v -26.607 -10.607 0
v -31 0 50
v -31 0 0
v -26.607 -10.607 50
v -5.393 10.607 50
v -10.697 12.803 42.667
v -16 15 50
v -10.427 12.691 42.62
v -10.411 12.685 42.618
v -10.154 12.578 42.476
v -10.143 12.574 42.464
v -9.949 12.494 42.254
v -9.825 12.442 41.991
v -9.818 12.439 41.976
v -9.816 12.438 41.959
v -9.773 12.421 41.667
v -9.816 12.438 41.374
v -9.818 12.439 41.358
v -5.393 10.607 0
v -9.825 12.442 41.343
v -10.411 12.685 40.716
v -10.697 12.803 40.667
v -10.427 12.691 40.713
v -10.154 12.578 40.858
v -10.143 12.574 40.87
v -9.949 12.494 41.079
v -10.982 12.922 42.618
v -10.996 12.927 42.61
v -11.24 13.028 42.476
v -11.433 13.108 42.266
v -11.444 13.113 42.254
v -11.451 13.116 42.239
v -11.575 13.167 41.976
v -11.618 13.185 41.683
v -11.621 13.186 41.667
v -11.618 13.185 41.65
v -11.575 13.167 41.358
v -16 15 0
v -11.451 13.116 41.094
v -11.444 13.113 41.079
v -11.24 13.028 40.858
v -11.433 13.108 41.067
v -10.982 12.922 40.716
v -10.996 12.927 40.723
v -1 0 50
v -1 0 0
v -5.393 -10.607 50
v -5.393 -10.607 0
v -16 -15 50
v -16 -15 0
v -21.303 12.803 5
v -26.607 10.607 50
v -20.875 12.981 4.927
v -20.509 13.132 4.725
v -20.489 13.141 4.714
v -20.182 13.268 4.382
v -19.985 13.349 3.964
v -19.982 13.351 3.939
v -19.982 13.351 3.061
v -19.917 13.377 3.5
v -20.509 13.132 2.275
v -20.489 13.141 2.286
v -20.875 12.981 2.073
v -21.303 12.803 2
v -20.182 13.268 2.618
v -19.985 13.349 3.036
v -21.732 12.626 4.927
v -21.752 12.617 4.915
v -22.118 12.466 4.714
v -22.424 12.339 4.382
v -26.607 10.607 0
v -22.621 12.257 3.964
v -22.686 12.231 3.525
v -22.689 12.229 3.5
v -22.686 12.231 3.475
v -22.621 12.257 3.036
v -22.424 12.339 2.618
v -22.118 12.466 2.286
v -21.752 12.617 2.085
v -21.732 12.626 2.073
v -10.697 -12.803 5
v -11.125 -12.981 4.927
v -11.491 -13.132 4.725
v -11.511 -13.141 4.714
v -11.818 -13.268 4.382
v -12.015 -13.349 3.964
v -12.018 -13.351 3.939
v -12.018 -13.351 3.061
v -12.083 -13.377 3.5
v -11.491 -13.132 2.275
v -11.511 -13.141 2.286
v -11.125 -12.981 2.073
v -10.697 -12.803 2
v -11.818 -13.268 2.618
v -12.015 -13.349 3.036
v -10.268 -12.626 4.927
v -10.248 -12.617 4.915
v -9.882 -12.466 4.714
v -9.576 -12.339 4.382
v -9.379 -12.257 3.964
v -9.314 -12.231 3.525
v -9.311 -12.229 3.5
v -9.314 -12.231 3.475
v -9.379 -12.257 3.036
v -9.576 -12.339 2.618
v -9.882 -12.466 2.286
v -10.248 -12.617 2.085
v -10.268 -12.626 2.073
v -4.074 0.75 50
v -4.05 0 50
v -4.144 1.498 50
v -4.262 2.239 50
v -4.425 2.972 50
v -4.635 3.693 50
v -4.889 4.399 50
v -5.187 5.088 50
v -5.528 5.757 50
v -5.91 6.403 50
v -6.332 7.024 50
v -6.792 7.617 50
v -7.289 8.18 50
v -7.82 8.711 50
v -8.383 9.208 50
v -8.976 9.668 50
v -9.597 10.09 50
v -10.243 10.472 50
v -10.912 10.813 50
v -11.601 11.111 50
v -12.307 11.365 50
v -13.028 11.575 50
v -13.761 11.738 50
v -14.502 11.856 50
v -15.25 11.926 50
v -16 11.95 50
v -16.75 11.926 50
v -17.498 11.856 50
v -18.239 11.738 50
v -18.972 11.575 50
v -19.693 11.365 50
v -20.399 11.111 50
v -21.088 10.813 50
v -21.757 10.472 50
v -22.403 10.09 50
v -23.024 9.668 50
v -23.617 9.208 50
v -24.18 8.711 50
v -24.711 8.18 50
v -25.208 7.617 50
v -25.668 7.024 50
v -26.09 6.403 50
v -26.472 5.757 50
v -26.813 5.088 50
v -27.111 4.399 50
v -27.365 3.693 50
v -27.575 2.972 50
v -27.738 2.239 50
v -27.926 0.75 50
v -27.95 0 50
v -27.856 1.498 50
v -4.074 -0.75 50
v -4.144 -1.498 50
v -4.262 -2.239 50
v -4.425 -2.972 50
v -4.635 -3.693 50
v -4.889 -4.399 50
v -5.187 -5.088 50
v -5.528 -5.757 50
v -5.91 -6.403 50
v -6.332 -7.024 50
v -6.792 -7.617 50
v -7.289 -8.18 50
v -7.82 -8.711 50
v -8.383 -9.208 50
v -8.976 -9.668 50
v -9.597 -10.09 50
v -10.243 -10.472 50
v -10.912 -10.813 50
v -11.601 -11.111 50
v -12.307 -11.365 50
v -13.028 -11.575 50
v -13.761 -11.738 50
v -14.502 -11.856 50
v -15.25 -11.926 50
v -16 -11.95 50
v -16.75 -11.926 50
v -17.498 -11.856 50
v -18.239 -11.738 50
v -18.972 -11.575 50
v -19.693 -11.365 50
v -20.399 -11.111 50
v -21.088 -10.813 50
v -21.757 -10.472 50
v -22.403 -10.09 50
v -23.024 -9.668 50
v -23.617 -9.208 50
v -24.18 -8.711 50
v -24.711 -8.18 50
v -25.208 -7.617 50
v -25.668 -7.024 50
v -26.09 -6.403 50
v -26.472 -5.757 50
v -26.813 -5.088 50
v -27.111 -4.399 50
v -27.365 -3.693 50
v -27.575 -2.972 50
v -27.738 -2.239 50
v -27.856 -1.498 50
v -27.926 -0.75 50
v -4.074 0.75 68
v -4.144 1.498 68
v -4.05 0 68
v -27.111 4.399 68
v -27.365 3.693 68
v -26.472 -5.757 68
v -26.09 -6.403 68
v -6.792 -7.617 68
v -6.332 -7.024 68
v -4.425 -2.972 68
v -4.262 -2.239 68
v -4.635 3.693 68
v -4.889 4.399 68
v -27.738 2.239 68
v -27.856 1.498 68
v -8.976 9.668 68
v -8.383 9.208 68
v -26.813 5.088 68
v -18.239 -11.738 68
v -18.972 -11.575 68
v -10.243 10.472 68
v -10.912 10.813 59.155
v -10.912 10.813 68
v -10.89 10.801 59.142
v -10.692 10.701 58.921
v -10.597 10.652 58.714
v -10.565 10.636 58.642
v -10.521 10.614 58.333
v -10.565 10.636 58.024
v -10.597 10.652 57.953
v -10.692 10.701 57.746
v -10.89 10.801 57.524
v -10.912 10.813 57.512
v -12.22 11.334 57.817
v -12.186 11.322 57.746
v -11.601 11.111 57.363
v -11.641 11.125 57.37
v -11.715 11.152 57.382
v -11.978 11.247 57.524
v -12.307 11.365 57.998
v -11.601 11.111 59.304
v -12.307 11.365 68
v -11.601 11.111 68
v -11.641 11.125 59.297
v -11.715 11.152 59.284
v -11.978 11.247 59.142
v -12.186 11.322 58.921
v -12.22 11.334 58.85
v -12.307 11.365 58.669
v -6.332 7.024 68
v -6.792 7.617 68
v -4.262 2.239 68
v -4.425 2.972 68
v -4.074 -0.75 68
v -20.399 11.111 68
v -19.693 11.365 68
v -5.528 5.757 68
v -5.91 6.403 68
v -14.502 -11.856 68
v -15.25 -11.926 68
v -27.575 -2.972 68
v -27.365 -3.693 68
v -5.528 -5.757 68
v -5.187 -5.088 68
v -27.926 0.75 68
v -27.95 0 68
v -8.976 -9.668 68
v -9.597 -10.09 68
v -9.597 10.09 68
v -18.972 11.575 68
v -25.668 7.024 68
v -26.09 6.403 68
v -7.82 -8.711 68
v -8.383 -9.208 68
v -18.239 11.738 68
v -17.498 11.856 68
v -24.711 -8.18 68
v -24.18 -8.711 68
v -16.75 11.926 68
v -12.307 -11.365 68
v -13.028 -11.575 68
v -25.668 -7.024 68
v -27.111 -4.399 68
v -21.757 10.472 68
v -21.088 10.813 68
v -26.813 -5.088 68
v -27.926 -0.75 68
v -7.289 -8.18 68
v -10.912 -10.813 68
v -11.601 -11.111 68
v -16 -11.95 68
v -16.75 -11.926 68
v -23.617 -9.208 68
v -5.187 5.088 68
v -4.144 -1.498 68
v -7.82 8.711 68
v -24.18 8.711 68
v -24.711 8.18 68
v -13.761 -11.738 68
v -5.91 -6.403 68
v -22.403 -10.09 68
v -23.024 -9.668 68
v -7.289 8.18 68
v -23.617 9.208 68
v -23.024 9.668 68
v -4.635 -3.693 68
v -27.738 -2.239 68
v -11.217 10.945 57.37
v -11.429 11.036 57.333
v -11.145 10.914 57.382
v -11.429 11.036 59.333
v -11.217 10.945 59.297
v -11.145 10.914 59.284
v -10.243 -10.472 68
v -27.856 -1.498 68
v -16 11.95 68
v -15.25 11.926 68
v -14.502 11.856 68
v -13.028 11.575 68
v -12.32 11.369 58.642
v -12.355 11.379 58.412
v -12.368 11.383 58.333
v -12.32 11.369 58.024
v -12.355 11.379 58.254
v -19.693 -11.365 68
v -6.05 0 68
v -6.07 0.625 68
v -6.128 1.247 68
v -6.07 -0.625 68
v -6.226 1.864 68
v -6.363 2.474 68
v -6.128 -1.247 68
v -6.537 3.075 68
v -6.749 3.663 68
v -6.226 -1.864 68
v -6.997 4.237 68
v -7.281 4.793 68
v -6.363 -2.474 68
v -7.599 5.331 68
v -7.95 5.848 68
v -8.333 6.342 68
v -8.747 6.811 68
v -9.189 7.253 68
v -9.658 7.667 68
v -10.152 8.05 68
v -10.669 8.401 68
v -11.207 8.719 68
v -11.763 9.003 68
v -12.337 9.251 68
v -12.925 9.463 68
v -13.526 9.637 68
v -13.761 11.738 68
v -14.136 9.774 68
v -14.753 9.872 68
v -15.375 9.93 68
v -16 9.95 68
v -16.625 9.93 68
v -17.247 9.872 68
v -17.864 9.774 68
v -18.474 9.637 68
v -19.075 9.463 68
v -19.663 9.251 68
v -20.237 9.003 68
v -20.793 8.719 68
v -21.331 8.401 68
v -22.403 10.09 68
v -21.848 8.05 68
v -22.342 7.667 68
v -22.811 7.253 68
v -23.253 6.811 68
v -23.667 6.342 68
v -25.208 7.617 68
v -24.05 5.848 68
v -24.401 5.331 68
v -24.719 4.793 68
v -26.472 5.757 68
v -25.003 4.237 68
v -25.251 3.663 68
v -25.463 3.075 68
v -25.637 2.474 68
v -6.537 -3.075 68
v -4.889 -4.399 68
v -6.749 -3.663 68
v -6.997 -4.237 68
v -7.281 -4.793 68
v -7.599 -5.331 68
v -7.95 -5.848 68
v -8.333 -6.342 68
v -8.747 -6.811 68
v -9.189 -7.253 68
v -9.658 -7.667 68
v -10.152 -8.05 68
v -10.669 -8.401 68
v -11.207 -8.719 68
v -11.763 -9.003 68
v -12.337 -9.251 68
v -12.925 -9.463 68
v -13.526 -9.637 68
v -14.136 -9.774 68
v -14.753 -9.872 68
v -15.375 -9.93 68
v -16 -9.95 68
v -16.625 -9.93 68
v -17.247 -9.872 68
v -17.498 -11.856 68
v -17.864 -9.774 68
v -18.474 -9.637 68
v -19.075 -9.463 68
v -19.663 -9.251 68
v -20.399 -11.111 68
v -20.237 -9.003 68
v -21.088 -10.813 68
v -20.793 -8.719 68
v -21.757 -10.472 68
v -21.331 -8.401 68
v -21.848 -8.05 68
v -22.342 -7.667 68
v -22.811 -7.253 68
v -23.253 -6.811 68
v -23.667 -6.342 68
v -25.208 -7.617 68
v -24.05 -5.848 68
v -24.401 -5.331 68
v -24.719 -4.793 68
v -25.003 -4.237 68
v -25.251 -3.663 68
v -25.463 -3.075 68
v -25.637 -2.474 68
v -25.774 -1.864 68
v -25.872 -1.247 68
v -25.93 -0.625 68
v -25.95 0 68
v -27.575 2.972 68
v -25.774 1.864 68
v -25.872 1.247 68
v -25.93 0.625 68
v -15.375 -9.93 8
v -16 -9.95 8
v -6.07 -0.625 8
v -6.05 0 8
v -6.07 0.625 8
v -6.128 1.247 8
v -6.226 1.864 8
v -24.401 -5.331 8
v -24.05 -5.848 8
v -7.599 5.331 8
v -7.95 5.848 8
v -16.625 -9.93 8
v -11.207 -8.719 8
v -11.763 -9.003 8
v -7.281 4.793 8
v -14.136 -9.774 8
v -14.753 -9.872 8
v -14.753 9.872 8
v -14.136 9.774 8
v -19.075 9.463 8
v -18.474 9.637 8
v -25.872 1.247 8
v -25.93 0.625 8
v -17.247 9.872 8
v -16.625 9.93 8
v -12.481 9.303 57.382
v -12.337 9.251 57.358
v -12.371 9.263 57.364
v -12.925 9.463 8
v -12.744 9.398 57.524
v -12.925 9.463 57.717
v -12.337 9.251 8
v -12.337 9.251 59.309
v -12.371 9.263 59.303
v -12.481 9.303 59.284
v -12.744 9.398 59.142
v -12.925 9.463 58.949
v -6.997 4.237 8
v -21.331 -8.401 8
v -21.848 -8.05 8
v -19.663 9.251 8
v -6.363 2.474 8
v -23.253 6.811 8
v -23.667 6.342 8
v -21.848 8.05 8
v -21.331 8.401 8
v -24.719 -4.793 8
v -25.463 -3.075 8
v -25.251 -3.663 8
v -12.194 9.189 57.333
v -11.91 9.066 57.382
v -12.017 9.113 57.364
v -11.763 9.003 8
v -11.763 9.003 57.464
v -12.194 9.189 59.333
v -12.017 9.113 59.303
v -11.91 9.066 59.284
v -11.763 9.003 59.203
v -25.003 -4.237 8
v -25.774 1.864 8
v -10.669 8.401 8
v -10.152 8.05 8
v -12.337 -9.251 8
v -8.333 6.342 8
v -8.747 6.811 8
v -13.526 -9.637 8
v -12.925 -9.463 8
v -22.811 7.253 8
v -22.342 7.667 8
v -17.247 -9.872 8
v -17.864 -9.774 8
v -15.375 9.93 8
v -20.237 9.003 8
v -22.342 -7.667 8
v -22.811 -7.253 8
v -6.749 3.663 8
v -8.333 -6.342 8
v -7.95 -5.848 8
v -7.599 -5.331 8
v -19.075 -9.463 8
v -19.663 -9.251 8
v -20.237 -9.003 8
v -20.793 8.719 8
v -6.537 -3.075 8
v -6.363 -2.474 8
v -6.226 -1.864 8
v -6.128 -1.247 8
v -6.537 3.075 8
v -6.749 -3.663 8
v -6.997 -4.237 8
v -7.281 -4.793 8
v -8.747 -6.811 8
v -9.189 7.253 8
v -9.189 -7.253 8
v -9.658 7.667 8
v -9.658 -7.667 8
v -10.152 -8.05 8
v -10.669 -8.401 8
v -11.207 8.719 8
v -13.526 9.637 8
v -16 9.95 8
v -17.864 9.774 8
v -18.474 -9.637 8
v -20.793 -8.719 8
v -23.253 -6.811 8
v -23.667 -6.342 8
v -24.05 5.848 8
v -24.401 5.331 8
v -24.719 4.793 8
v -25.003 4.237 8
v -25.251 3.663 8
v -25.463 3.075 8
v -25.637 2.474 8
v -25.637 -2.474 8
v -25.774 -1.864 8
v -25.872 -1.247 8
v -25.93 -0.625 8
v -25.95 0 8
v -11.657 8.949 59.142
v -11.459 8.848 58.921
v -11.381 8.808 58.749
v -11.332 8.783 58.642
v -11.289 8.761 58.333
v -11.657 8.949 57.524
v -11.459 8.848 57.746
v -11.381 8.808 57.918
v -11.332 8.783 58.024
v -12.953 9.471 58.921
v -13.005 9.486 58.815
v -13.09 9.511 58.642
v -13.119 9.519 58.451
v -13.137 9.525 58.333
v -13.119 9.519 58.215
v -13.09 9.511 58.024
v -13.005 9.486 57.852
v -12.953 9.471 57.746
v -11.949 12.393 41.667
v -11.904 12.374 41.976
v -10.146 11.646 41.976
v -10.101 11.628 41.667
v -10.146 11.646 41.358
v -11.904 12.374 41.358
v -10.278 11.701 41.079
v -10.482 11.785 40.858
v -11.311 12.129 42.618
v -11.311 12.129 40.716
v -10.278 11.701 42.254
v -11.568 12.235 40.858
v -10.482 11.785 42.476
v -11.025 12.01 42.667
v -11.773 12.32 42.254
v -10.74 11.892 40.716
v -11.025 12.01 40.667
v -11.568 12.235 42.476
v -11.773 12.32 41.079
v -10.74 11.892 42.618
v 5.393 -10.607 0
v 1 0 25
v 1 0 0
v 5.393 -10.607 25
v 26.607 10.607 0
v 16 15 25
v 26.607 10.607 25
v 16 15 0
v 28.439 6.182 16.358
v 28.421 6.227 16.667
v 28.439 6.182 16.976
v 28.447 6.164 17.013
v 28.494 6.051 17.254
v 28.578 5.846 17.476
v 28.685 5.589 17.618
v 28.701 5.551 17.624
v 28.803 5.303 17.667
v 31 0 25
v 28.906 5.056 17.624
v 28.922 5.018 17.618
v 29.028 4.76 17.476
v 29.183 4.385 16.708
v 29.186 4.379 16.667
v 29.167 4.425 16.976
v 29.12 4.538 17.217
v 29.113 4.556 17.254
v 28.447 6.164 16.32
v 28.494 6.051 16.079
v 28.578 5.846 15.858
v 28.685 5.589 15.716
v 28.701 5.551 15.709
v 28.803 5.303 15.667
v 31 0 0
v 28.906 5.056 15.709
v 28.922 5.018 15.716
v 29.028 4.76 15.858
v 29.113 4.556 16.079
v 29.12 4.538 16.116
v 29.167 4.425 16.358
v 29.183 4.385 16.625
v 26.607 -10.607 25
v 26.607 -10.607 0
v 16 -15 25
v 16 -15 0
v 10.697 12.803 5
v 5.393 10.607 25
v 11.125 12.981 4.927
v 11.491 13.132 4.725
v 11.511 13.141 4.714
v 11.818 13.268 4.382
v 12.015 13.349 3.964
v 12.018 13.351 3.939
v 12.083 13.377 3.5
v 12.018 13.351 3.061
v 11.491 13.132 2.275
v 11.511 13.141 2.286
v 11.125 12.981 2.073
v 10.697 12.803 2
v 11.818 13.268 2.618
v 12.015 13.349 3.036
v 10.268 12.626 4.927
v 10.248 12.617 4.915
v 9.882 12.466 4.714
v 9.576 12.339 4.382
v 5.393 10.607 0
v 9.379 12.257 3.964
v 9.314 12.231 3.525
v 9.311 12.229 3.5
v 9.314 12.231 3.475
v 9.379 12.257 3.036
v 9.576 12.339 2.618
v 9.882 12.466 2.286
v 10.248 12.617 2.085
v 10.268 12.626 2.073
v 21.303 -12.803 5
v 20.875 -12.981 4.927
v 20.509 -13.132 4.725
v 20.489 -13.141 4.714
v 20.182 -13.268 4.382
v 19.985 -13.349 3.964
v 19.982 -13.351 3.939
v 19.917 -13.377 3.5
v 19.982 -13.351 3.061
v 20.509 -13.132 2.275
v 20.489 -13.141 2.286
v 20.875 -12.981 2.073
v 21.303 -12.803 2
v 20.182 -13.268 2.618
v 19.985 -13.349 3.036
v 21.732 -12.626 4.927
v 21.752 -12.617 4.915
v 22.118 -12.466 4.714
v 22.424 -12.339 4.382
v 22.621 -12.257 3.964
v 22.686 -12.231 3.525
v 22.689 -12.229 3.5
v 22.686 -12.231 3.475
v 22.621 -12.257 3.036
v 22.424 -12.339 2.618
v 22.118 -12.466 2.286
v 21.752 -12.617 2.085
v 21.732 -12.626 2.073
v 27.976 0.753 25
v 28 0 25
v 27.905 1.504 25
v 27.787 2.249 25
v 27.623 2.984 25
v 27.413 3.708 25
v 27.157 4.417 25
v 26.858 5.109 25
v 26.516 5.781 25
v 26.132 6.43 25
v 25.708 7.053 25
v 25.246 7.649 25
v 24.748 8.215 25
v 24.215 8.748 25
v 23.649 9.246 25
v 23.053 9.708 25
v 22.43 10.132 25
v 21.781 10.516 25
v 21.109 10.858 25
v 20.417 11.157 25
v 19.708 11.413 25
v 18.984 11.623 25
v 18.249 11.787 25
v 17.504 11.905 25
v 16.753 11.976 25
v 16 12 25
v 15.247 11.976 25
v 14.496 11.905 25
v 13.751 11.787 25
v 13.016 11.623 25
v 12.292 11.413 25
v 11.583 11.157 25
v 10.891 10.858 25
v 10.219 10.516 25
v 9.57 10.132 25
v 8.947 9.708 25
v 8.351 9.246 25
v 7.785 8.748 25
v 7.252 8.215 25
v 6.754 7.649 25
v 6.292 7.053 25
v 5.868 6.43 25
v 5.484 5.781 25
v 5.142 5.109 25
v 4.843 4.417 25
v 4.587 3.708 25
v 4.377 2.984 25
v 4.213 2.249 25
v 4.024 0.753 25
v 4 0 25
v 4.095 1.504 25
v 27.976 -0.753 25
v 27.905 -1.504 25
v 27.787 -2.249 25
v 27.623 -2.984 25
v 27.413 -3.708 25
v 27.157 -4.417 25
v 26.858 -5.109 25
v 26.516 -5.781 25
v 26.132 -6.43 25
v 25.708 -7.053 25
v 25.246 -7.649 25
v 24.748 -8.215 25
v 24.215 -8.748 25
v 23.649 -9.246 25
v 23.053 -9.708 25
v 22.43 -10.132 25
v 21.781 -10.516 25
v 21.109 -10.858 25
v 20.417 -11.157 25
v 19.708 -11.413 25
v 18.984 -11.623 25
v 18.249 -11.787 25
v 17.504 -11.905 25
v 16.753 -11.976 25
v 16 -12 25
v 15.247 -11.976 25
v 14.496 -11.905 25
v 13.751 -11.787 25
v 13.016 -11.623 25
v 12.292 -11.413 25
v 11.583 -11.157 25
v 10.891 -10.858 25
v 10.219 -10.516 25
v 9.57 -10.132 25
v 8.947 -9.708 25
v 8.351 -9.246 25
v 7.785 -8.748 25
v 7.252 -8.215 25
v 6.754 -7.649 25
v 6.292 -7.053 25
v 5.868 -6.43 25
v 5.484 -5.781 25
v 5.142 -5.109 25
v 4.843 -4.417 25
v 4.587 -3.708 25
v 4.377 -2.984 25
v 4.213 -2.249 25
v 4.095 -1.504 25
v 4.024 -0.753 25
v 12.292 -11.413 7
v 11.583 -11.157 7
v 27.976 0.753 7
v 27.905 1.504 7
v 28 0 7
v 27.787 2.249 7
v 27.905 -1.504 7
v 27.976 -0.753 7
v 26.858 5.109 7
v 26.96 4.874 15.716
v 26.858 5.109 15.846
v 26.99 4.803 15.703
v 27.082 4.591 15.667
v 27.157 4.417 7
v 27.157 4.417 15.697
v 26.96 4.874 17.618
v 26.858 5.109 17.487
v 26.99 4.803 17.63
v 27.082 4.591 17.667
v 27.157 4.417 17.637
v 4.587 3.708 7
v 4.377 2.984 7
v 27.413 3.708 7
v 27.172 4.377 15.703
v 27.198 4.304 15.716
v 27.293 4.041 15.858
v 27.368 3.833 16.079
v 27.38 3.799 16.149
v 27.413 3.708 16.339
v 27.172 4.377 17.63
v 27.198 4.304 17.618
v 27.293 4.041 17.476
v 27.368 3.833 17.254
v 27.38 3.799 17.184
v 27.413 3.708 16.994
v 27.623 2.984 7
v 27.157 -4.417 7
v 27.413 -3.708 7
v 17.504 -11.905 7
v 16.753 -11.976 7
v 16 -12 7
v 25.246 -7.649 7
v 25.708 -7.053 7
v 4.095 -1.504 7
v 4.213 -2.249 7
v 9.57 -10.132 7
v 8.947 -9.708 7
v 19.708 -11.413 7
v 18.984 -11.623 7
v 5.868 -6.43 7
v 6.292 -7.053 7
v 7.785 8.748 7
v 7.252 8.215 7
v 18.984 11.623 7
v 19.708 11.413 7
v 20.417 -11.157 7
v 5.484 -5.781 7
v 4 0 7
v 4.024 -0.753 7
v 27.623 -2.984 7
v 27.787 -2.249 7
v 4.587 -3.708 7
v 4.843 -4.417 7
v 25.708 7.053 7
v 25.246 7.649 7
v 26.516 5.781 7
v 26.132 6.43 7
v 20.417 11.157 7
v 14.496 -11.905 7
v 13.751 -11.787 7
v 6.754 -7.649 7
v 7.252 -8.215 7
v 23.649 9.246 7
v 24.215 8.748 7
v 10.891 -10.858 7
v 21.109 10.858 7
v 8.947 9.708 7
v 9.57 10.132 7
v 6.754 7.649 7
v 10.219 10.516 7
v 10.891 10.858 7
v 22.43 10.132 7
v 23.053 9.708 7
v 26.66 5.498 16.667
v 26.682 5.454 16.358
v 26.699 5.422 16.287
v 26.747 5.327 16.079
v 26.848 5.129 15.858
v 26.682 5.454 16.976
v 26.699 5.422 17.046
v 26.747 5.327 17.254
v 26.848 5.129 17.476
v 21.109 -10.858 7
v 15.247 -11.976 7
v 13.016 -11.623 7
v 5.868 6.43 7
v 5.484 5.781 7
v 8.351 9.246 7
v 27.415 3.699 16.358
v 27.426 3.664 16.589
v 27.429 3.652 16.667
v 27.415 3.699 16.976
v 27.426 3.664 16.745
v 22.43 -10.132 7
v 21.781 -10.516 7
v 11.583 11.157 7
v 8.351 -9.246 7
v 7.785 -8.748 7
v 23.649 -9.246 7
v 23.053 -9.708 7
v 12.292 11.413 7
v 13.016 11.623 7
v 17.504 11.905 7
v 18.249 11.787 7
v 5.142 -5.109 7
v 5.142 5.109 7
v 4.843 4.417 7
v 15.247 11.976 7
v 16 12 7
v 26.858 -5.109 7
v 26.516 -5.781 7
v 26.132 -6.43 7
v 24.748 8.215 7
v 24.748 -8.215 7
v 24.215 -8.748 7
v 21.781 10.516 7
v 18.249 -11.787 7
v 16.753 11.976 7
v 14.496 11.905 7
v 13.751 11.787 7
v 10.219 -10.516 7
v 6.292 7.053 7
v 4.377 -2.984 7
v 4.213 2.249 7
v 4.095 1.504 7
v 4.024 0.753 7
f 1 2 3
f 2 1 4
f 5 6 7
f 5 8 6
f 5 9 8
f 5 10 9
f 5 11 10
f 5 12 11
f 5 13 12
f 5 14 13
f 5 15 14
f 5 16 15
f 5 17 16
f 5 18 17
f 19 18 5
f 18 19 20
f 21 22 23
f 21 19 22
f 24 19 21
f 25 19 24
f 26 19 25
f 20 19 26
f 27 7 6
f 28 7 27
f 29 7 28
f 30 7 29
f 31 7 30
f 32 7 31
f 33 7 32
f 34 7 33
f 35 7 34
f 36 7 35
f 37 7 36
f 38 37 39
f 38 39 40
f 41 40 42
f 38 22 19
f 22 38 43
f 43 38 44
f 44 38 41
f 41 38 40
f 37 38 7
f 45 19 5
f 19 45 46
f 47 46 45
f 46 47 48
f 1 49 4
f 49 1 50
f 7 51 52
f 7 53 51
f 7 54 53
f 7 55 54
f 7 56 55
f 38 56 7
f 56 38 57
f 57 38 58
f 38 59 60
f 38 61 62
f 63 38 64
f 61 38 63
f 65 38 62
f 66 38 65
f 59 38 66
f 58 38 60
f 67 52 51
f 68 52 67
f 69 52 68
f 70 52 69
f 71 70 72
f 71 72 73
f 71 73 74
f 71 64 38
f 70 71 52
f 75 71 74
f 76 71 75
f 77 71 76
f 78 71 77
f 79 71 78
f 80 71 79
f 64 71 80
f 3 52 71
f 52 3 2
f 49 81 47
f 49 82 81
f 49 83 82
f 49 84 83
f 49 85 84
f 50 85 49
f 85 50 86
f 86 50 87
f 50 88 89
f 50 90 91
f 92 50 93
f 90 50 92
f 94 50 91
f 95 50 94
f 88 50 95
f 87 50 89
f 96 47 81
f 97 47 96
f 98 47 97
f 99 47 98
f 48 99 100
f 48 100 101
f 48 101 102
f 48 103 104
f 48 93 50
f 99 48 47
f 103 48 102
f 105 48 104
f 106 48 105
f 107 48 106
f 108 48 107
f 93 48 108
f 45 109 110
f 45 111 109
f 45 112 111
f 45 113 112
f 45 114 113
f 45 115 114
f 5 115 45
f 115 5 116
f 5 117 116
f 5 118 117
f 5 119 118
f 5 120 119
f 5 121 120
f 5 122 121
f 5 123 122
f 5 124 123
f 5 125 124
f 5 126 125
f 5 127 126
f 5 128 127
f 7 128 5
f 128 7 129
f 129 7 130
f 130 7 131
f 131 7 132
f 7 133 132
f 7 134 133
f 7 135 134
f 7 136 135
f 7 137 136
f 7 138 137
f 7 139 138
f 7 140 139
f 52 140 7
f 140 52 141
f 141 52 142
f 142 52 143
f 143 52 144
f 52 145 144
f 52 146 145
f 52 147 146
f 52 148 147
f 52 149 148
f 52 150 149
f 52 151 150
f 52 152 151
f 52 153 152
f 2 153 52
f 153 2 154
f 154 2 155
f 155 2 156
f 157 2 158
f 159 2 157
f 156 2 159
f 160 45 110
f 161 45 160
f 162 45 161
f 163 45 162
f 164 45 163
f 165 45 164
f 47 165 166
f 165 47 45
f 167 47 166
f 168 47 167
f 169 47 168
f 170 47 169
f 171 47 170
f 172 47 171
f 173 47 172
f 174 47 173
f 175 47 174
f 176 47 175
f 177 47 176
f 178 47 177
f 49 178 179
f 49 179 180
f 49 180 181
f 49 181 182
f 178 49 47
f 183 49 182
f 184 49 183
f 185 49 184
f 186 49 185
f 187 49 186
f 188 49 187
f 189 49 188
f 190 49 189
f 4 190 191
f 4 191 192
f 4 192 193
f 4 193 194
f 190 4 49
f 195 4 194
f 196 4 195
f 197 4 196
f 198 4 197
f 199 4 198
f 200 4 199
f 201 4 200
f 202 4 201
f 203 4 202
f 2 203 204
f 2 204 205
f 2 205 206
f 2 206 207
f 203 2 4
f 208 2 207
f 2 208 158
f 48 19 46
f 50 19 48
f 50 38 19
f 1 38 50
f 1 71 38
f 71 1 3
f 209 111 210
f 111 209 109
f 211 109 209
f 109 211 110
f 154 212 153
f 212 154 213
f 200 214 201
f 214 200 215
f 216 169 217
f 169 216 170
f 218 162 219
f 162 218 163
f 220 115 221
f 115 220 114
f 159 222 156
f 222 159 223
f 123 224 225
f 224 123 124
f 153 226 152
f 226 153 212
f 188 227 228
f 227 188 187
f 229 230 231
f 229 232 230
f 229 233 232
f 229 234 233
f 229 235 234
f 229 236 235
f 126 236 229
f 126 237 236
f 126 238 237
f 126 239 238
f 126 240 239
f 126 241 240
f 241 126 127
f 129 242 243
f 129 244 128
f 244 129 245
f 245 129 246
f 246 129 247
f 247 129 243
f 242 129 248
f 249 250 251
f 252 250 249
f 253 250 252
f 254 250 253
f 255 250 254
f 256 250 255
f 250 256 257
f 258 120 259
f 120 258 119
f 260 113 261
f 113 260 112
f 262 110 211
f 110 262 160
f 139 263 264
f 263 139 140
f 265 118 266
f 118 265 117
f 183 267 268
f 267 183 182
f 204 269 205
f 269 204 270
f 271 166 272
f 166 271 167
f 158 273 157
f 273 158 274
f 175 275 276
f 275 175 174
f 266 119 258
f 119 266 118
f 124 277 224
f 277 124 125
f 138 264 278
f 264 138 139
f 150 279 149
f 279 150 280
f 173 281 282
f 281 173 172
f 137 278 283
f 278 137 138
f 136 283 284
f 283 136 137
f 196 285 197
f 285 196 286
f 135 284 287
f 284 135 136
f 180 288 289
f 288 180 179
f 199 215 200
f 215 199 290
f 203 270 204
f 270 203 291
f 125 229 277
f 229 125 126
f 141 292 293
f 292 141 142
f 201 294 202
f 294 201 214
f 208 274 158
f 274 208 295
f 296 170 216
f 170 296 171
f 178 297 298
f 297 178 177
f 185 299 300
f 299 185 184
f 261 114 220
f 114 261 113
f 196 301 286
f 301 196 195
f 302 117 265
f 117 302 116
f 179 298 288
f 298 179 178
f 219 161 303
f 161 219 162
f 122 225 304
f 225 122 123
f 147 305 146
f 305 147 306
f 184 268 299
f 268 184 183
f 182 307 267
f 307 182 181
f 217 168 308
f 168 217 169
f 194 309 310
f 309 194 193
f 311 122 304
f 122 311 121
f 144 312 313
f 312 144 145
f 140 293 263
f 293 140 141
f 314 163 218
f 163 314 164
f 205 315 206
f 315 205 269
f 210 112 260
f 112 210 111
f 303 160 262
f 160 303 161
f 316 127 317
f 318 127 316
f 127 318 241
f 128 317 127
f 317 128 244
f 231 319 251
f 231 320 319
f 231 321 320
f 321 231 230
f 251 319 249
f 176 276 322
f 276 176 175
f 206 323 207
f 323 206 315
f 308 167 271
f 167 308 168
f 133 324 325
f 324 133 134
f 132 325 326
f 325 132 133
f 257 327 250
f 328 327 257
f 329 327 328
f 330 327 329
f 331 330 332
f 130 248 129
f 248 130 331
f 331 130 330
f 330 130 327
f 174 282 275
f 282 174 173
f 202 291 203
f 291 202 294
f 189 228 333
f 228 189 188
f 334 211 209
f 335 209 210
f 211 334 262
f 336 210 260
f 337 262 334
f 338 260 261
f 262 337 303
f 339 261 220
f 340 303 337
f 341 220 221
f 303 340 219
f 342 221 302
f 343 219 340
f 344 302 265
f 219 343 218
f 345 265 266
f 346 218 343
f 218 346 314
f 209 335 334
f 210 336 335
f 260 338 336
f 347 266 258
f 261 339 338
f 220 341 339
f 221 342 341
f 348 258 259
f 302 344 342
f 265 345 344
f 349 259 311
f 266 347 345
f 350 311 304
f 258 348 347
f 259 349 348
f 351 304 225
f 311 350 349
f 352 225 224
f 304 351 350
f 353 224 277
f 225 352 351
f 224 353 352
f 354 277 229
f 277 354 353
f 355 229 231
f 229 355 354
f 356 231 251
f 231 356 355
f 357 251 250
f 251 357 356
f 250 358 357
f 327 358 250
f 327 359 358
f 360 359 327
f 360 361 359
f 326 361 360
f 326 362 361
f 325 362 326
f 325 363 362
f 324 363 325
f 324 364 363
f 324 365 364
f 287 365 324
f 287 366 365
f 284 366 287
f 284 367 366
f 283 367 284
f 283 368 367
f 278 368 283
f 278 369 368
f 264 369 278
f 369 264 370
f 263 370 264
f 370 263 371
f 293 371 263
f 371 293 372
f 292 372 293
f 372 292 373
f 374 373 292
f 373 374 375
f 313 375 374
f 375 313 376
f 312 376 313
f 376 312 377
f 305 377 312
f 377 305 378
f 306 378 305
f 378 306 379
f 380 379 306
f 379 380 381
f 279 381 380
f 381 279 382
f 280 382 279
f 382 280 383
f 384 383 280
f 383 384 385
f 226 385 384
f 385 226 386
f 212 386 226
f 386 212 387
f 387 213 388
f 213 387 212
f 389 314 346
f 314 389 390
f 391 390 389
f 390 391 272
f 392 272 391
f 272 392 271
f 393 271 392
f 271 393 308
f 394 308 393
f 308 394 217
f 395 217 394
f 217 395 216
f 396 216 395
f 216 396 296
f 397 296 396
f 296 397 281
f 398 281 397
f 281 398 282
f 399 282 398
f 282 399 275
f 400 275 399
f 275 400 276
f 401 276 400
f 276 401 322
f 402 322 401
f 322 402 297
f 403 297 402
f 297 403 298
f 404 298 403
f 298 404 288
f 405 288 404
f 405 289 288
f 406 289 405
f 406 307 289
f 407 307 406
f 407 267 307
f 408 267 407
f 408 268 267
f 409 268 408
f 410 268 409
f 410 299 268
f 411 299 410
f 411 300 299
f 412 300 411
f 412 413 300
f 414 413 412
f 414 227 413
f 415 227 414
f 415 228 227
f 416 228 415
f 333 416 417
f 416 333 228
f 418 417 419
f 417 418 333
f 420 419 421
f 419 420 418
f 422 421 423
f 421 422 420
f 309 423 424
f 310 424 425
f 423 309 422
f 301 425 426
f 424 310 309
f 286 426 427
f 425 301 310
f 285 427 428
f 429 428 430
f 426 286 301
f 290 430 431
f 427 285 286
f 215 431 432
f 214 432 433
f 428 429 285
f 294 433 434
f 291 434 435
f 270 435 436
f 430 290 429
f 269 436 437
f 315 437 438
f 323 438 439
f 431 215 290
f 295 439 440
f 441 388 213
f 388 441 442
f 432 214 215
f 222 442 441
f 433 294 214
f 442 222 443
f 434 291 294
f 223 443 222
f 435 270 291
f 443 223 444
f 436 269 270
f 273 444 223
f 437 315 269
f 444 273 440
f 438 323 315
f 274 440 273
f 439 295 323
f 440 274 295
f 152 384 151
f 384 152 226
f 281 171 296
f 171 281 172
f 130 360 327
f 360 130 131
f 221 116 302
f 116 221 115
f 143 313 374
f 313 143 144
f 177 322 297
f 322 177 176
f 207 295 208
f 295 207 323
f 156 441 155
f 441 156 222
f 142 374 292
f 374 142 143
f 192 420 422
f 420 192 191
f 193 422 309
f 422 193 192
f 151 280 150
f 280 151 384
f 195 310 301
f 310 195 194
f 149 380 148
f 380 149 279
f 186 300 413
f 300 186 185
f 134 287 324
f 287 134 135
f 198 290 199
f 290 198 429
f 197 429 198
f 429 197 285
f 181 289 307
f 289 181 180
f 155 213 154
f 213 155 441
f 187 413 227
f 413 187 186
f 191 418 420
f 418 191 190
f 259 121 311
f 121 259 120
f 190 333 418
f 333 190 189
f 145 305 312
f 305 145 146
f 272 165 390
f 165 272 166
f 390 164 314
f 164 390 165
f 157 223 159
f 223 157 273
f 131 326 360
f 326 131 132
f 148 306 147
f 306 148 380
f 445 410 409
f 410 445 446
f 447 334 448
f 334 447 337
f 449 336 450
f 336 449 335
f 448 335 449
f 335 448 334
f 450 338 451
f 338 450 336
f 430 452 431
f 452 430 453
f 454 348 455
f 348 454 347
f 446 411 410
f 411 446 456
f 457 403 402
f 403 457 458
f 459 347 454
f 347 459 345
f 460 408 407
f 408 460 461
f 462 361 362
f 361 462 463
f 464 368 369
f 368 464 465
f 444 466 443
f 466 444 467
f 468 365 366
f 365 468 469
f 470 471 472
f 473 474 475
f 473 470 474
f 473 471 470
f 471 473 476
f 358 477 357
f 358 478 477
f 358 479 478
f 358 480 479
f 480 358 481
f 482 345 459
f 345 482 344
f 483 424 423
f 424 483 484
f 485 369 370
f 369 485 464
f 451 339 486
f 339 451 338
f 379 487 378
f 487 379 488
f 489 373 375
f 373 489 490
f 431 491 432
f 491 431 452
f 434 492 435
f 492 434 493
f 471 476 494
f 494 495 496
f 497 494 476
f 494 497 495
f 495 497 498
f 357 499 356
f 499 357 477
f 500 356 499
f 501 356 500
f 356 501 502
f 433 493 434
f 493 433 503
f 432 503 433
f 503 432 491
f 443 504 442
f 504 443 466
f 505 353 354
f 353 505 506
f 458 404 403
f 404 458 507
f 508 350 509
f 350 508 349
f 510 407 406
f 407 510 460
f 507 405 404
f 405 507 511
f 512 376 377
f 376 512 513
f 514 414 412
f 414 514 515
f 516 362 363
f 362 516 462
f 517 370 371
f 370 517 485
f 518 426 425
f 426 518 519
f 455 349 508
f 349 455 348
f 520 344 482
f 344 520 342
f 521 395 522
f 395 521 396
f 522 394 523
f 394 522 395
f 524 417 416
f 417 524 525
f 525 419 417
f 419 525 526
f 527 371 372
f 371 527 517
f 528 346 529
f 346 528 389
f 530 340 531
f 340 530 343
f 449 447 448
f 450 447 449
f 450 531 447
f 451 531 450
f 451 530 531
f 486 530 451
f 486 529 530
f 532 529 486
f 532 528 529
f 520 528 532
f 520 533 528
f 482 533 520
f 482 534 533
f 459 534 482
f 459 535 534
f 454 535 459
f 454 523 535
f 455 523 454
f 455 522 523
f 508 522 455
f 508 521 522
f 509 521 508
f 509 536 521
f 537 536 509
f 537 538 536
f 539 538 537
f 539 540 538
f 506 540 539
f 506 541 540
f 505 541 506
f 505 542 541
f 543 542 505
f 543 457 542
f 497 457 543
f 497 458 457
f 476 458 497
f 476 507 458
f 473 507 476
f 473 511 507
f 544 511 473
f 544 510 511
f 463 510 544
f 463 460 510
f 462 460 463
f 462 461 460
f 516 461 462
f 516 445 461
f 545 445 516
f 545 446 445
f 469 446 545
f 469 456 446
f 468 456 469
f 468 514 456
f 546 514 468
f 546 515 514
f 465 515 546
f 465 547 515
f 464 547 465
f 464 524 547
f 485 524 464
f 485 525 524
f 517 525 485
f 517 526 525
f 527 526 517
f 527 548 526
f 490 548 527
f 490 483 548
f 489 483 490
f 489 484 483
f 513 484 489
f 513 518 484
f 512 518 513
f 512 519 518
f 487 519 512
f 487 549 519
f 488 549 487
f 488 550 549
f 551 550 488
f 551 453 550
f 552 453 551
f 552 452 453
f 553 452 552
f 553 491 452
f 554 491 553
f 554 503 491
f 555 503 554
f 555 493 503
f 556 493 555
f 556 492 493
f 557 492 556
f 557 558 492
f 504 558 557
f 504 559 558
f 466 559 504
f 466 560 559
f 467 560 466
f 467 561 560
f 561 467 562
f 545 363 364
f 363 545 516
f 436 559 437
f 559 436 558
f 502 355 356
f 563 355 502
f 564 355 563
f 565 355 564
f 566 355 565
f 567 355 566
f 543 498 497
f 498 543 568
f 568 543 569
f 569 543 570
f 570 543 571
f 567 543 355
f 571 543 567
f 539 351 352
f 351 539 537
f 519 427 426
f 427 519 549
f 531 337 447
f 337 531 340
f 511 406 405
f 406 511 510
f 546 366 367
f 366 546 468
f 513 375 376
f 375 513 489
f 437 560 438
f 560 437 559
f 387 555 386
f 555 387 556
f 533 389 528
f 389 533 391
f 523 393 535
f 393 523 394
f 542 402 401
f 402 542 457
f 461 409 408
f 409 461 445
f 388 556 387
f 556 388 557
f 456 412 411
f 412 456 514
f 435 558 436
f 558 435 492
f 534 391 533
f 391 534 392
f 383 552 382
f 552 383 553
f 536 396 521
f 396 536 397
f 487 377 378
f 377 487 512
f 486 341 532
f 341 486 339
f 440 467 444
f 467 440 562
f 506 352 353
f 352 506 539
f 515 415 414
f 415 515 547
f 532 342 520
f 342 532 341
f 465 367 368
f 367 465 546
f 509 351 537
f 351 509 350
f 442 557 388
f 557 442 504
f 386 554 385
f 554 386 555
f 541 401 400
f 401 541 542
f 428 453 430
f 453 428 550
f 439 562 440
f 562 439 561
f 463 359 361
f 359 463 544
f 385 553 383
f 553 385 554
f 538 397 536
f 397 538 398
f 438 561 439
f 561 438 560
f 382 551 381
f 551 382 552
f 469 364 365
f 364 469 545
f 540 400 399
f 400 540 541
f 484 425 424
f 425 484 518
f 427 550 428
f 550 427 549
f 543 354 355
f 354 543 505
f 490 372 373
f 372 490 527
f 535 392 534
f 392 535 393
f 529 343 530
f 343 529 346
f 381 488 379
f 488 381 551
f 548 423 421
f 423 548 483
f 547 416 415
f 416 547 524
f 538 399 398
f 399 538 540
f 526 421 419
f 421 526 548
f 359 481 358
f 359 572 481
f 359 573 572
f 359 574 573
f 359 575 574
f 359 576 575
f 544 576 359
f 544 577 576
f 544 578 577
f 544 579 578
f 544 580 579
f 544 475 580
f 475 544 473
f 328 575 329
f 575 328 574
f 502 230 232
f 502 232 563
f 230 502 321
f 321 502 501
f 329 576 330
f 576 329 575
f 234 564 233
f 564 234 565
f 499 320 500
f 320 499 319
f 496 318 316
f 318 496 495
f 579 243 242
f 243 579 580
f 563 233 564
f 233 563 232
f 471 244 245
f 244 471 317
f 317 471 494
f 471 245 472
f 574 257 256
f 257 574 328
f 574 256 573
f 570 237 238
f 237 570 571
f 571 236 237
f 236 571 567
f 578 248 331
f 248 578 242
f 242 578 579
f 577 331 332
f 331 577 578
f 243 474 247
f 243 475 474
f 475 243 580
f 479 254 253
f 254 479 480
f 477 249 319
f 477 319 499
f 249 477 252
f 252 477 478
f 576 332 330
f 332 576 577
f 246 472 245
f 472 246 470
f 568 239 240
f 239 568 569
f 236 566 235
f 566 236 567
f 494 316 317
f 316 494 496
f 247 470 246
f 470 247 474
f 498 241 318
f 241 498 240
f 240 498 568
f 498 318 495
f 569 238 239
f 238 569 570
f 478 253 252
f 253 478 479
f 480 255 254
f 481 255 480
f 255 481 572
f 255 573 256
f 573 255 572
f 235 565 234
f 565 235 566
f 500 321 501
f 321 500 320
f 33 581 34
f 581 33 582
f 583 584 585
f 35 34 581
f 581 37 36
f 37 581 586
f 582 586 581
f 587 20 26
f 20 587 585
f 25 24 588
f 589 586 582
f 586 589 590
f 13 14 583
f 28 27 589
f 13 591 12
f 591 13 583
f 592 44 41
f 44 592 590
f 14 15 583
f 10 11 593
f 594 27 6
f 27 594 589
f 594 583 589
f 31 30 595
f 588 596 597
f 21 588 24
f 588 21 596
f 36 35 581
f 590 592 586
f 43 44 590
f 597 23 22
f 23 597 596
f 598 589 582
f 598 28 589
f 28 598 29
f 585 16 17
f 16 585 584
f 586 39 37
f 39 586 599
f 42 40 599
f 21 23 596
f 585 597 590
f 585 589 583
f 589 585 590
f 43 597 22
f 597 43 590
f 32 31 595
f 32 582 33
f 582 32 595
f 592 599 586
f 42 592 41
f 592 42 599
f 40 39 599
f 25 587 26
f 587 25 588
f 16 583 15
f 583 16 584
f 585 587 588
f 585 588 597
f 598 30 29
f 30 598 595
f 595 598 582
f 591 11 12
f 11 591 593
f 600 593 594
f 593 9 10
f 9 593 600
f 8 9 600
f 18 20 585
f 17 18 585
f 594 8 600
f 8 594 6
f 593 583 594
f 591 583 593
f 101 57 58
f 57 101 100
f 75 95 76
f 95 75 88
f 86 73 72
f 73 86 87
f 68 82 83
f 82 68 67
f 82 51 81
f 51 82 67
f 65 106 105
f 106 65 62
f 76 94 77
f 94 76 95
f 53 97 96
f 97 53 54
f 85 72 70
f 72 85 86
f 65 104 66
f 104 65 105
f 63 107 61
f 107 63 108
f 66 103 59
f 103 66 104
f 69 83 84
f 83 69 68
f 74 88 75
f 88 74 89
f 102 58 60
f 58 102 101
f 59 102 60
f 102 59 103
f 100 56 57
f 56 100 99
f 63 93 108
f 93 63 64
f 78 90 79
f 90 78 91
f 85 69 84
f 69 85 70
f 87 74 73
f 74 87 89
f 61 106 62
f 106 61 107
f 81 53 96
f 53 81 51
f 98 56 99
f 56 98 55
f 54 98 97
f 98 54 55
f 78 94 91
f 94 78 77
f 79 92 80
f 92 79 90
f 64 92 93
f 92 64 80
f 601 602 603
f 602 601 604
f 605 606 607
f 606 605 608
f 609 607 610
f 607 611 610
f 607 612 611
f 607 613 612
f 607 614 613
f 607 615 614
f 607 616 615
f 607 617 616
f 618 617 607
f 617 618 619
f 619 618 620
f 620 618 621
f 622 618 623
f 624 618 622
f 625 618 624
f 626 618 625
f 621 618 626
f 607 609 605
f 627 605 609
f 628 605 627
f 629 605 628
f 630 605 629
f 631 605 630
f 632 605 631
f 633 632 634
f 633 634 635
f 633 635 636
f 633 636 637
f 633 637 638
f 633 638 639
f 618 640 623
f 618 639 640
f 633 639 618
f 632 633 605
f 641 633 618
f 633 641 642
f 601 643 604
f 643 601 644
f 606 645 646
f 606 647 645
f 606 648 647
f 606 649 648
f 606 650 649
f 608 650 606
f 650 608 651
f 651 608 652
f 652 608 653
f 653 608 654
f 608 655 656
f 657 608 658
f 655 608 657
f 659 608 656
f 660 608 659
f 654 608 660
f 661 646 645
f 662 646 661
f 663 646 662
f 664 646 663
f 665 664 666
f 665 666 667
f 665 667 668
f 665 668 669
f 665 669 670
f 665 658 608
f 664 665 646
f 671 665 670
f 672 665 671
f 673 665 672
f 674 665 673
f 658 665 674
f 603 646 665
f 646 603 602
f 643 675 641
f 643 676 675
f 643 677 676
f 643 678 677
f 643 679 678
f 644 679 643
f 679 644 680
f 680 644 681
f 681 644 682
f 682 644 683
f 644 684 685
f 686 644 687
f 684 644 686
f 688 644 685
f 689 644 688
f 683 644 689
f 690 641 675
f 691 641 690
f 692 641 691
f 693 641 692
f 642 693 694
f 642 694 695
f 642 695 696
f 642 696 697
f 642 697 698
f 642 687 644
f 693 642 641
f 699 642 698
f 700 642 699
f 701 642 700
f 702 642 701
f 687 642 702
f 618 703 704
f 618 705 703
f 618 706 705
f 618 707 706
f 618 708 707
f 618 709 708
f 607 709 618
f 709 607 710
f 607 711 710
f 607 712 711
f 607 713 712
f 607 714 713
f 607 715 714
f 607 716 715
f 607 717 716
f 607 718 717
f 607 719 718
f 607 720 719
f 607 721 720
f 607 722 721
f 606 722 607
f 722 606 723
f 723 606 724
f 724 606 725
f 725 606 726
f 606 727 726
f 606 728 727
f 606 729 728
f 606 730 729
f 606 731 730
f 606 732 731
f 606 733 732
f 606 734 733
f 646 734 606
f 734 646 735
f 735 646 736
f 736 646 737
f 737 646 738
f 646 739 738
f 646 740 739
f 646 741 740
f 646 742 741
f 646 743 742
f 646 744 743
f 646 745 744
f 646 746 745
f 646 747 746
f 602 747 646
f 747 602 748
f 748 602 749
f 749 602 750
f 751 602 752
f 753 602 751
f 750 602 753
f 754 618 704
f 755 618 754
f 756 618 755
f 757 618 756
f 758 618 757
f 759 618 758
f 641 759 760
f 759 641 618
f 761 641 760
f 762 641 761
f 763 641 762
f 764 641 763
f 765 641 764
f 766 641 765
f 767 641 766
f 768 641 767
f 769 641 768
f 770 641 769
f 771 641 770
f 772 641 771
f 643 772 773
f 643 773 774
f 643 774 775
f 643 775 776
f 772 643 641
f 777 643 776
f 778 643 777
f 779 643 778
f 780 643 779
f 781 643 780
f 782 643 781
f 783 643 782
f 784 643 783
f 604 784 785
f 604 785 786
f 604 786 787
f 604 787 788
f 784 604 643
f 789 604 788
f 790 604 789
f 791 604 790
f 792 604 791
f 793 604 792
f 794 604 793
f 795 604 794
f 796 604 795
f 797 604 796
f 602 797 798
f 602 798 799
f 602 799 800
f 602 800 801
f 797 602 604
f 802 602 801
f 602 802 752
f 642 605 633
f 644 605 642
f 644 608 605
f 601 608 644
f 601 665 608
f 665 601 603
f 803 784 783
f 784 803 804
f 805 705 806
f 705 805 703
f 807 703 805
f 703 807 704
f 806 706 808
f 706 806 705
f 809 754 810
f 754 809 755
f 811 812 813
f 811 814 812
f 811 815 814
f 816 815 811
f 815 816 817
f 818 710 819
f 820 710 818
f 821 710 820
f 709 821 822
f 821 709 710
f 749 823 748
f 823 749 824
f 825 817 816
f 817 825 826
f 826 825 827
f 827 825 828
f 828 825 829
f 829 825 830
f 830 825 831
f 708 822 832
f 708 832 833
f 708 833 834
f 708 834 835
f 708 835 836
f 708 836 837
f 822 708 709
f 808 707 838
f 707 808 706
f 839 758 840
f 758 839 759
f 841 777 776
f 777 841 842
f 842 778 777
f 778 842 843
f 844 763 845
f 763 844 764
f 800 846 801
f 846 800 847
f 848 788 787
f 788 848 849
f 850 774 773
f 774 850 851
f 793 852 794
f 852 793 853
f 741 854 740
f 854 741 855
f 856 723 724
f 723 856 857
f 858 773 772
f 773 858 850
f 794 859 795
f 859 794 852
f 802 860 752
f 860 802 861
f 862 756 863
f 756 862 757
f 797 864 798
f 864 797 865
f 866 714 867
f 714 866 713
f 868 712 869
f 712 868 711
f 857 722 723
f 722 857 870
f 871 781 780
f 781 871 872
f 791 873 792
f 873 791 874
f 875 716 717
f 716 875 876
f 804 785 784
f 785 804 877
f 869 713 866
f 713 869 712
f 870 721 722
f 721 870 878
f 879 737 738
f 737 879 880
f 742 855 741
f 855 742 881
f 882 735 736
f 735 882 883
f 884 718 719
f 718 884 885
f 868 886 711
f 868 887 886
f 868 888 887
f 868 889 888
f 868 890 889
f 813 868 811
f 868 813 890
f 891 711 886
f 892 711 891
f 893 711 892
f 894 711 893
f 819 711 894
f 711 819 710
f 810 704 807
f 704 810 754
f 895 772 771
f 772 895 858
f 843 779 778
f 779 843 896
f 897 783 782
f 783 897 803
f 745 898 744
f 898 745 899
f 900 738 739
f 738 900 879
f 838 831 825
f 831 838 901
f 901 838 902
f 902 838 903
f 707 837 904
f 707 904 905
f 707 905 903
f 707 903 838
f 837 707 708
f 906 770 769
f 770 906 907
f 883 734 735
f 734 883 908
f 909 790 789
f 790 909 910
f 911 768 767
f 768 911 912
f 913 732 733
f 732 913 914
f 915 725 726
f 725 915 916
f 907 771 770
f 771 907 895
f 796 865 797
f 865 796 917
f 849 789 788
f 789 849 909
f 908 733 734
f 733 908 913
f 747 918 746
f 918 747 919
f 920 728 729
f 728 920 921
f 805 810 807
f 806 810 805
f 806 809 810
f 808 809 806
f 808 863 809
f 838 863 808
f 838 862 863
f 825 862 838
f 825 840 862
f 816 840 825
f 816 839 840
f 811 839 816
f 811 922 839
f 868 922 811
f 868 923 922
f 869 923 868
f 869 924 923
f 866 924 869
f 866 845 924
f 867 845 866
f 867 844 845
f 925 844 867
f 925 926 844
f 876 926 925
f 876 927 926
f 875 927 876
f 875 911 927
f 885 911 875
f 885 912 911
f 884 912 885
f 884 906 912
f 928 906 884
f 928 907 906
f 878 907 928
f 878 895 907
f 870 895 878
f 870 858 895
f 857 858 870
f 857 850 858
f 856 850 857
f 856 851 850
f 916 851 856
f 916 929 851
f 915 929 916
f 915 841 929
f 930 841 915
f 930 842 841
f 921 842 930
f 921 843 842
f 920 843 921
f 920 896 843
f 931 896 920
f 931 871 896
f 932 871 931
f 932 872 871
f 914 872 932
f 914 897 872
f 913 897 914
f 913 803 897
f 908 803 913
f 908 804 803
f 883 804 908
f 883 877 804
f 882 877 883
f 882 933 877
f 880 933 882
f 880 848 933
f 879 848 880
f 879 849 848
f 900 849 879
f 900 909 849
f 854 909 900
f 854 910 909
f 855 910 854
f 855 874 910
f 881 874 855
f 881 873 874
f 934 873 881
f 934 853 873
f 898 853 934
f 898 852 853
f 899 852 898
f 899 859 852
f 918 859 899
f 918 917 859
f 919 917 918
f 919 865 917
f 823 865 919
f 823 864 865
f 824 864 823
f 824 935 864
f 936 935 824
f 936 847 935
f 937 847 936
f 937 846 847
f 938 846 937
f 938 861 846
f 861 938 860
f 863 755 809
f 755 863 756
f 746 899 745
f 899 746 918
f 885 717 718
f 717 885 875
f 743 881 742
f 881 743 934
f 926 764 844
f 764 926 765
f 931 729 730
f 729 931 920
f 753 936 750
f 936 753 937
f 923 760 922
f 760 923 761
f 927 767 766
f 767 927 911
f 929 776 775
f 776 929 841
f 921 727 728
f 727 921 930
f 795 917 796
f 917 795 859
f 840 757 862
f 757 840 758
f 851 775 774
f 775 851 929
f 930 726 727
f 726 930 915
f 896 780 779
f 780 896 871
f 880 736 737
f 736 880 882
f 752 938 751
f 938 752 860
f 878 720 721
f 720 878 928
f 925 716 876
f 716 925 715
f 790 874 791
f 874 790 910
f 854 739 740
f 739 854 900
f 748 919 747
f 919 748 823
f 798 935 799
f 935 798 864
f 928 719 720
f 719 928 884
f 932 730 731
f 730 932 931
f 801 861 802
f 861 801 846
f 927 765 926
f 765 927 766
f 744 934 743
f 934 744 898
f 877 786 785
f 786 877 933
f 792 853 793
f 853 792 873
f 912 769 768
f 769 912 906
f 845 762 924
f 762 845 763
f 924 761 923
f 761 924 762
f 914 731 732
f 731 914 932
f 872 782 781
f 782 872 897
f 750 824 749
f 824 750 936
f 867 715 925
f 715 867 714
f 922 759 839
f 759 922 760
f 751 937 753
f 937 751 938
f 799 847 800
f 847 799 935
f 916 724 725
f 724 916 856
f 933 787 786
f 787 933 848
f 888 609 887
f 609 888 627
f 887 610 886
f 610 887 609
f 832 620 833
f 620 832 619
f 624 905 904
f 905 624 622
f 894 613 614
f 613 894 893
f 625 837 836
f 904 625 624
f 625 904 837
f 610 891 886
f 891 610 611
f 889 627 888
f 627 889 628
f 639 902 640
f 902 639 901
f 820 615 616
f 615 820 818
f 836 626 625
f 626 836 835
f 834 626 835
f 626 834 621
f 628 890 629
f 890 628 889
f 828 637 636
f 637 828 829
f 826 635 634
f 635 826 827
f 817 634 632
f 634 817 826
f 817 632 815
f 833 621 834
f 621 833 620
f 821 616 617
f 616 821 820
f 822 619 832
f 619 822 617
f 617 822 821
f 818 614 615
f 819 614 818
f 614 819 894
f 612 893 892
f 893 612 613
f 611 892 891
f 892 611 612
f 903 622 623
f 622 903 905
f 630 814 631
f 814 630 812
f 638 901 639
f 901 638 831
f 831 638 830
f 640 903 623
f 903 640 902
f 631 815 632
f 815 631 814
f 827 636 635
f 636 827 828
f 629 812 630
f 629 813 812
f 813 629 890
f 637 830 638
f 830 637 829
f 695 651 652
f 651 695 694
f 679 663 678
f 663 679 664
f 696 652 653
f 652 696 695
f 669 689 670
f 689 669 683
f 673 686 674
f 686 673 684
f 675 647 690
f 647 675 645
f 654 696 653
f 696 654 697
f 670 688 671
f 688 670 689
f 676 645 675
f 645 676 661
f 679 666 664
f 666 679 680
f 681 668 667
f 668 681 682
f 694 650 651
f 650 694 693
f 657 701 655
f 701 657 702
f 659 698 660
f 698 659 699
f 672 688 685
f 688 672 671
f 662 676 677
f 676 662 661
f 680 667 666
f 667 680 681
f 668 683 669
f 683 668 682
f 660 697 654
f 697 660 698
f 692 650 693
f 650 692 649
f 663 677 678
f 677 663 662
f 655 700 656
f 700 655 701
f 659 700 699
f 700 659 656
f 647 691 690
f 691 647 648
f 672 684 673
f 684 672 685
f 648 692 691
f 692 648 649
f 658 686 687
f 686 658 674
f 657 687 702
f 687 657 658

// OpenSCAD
// Which parts would you like to see?
part = "both"; // [container:Container Only,lid:Lid Only,both:Both Container and Lid]

// What type of container would you like to make?
variant = 30; // [22:Giriko-ire(22mm),30:Fudeko-ire(30mm),35:Large Fudeko-ire(35mm)]
variant_radius=variant/2;

// How many sides?
shape = 8; // [8:Eight sides,12:Twelve sides,100:Round]

// How thick should the walls be? (mm)
wall_thickness = 2; // [1:4]

// Diameter of the string hole. (mm)
string_hole_diameter = 3; // [0:No hole,1:1mm,1.5:1.5mm,2:2mm,3:3mm,4:4mm,5:5mm]

// Diameter of the hole.
hole_diameter = 2; // [0:No hole,1:1mm,1.5:1.5mm,2:2mm,3:3mm,4:4mm,5:5mm]

// How much tolerance between the lid and container?
tolerance = 0.05; // [0.05,0.06,0.07,0.08,0.09,0.1,0.15,0.2,0.3,0.4,0.5]

angle_between_holes = shape==100?45:(360/shape);

half_angle_between_holes=angle_between_holes/2;

hole_radius = hole_diameter==0?0:hole_diameter/2;
string_hole_radius = string_hole_diameter==0?0:string_hole_diameter/2;

height = variant*2.5;
segment = height/3;
overlap = segment-(string_hole_diameter+4);


print_part();

module print_part() {
	if (part == "container") {
		container();
	} else if (part == "lid") {
		lid();
	} else if (part == "both") {
		both();
	} else {
		both();
	}
}

module both() {
	translate([-(variant_radius+1), 0, 0]) container();
	translate([variant_radius+1, 0, 0]) lid();
}

module container() {
	difference(){
		union(){
			//outer shape
			cylinder(r=variant_radius, h=segment*2, $fn=shape); 
			//overlap cylinder
			translate([0, 0, segment*2]) cylinder(r=variant_radius-(wall_thickness+1+tolerance), h=overlap, $fn=100);
		}
		// inside of container
		translate([0, 0, string_hole_diameter+5])cylinder(r=variant_radius-(wall_thickness+1+tolerance)-2, h=(segment*2)+overlap+2, $fn=100);
		// hole
		translate([0, 0, segment*2+(segment/3)]) rotate([90,0,half_angle_between_holes+angle_between_holes+90]) cylinder(r=hole_radius, h=variant_radius+1, $fn=20);
		// marker
		translate([0, 0, segment*2-(segment/3)]) rotate([90,0,half_angle_between_holes+angle_between_holes+90]) translate([0,0,variant_radius-2]) cylinder(r=hole_radius, h=variant_radius+1, $fn=20);
		// string hole
		translate([0, 0, string_hole_radius+2]) rotate([90,0,half_angle_between_holes]) cylinder(r=string_hole_radius, h=variant+1,center=true, $fn=20);

	}
}

module lid() {
	difference(){
		// outer shape
		cylinder(r=variant_radius, h=segment, $fn=shape);
		// cut-out cylinder
		translate([0, 0, string_hole_diameter+4]) cylinder(r=variant_radius-(wall_thickness+1), h=overlap+1, $fn=100);
		// hole 
		translate([0, 0, segment/3*2]) rotate([90,0,half_angle_between_holes+90]) cylinder(r=hole_radius, h=variant_radius+1, $fn=20);
		// string hole
		translate([0, 0, string_hole_radius+2]) rotate([90,0,half_angle_between_holes]) cylinder(r=string_hole_radius, h=variant+1,center=true, $fn=20);
	}
}
